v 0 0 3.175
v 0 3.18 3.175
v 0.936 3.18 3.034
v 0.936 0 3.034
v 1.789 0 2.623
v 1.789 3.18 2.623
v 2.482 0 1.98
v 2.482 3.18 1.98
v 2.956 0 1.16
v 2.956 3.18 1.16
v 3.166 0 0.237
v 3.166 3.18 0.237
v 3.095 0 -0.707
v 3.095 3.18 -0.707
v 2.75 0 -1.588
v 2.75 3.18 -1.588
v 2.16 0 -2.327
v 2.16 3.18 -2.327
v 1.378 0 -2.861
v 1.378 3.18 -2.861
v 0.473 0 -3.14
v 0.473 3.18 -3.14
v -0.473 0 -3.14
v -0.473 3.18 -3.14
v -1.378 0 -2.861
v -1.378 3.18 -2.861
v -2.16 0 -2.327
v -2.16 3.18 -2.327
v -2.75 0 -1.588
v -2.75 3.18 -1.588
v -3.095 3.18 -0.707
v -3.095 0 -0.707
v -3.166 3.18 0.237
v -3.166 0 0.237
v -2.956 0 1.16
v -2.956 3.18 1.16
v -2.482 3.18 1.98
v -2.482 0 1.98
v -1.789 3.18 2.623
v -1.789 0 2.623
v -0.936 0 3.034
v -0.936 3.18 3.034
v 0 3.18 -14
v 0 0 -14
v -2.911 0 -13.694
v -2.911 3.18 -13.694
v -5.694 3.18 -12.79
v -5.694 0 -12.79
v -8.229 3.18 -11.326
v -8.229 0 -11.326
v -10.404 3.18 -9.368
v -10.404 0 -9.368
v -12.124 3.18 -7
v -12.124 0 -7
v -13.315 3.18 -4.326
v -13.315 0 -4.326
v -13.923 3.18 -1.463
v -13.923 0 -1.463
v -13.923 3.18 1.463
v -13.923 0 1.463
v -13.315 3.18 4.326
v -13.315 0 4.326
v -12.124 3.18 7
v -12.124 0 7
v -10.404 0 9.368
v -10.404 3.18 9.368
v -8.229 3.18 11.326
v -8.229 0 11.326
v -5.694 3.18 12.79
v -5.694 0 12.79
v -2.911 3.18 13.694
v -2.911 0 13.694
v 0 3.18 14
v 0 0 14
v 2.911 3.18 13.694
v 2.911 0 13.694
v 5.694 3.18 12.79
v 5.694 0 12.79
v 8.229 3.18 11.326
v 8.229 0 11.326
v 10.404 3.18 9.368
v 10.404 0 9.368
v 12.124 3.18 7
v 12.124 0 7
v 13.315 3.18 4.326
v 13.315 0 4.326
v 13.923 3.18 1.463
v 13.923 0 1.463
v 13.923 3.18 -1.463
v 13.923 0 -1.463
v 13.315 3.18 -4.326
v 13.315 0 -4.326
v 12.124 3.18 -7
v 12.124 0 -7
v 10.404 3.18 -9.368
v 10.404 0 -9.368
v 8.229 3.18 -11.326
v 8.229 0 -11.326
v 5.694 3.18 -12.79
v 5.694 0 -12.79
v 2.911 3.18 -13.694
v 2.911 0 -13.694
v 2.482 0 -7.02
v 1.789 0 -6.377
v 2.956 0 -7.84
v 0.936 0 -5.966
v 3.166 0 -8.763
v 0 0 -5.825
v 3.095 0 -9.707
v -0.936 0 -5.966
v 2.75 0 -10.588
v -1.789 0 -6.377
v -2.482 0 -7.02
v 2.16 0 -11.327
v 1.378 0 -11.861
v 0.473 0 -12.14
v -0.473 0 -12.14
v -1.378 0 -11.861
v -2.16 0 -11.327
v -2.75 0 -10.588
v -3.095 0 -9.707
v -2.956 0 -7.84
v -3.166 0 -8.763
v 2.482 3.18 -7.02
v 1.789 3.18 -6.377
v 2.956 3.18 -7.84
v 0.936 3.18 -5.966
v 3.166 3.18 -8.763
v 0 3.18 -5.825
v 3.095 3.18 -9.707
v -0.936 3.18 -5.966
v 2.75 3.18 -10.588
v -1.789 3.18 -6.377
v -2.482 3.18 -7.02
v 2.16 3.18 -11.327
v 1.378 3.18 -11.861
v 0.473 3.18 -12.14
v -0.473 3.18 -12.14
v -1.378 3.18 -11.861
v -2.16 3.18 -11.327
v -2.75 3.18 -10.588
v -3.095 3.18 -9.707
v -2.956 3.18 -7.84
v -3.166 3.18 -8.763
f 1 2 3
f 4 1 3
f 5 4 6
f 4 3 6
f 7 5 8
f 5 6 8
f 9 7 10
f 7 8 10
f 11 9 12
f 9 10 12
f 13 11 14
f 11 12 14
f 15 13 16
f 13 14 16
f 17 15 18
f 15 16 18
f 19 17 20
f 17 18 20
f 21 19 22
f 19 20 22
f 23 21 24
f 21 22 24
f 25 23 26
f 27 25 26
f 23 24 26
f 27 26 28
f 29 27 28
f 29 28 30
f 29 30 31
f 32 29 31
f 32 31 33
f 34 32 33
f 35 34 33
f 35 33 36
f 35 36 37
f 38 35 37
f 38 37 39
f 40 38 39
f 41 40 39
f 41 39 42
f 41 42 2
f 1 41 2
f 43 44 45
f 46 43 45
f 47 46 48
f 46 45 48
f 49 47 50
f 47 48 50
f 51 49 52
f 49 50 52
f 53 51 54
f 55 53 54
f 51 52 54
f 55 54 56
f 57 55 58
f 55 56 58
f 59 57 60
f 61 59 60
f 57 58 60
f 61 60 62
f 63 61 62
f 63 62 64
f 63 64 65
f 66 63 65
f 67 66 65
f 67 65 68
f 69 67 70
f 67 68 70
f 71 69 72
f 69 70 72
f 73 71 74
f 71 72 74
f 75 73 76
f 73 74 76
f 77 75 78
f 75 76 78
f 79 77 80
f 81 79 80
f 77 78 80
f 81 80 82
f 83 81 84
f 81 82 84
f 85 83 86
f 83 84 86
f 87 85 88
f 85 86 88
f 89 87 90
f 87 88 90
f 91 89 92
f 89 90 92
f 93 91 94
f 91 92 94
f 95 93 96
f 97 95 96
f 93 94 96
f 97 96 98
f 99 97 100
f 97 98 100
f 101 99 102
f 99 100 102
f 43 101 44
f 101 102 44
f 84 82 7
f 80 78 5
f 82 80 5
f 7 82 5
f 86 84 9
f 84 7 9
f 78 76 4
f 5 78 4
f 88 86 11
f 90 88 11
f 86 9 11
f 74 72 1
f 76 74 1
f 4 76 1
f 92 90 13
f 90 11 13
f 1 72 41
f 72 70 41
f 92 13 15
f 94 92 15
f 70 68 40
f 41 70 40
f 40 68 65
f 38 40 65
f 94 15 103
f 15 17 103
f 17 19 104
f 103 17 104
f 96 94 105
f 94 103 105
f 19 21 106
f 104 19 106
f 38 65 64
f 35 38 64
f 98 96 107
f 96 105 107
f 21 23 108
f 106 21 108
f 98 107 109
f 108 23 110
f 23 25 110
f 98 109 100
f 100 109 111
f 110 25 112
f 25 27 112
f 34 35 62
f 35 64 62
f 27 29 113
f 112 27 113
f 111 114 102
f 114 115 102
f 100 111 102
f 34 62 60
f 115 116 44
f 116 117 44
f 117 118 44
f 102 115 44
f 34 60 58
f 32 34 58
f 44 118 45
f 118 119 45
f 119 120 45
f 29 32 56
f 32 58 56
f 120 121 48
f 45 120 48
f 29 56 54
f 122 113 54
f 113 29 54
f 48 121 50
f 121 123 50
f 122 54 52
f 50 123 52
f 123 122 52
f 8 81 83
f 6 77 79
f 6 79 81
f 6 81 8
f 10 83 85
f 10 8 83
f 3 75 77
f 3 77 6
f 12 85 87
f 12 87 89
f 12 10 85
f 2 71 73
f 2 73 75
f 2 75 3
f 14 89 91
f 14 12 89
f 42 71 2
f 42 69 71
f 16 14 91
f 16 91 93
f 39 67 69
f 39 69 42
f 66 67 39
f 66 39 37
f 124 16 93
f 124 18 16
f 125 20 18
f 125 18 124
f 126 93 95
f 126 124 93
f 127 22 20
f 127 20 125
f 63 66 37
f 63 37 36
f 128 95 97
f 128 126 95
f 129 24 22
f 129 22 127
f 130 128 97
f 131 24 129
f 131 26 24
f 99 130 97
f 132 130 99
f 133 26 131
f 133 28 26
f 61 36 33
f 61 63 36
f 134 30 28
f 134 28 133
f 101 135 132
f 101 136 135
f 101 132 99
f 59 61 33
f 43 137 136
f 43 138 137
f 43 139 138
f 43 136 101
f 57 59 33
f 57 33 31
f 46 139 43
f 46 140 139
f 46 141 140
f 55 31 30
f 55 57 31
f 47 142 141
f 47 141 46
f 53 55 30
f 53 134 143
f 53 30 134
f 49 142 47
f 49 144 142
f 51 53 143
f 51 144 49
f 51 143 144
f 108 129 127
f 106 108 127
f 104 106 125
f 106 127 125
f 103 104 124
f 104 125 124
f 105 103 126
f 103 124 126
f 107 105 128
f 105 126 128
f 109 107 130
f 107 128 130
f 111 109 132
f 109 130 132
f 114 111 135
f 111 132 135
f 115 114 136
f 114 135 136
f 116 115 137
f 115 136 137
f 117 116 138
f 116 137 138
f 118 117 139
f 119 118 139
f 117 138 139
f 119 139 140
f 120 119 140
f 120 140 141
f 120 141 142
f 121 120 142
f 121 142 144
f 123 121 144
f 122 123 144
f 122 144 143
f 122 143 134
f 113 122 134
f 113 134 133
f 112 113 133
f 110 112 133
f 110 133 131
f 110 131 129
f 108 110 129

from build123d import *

# Parameters (mm, degrees)
SKETCH1_R           = 14
BOSS_EXTRUDE1_DEPTH = 3.18
SKETCH2_R           = 3.175
CUT_EXTRUDE1_DEPTH  = 21.052740461
SKETCH3_R           = 3.175
CUT_EXTRUDE2_DEPTH  = 21.052740461


with BuildPart() as part:
    # Sketch1 → Boss-Extrude1 (new body)
    with BuildSketch(Plane(origin=(0, 0, 0), x_dir=(1, 0, 0), z_dir=(0, 1, 0))):
        with Locations(Location((0, 0, 0), (0, 0, 90))):
            Circle(SKETCH1_R)
    extrude(amount=BOSS_EXTRUDE1_DEPTH)

    # Sketch2 → Cut-Extrude1 (cut, through all)
    with BuildSketch(Plane(origin=(0, 3.18, 0), x_dir=(1, 0, 0), z_dir=(0, 1, 0))):
        with Locations(Location((0, 0, 0), (0, 0, 270))):
            Circle(SKETCH2_R)
    extrude(amount=-CUT_EXTRUDE1_DEPTH, mode=Mode.SUBTRACT)

    # Sketch3 → Cut-Extrude2 (cut, through all)
    with BuildSketch(Plane(origin=(0, 3.18, 0), x_dir=(1, 0, 0), z_dir=(0, 1, 0))):
        with Locations(Location((0, 9, 0), (0, 0, 270))):
            Circle(SKETCH3_R)
    extrude(amount=-CUT_EXTRUDE2_DEPTH, mode=Mode.SUBTRACT)


solid = part.part
